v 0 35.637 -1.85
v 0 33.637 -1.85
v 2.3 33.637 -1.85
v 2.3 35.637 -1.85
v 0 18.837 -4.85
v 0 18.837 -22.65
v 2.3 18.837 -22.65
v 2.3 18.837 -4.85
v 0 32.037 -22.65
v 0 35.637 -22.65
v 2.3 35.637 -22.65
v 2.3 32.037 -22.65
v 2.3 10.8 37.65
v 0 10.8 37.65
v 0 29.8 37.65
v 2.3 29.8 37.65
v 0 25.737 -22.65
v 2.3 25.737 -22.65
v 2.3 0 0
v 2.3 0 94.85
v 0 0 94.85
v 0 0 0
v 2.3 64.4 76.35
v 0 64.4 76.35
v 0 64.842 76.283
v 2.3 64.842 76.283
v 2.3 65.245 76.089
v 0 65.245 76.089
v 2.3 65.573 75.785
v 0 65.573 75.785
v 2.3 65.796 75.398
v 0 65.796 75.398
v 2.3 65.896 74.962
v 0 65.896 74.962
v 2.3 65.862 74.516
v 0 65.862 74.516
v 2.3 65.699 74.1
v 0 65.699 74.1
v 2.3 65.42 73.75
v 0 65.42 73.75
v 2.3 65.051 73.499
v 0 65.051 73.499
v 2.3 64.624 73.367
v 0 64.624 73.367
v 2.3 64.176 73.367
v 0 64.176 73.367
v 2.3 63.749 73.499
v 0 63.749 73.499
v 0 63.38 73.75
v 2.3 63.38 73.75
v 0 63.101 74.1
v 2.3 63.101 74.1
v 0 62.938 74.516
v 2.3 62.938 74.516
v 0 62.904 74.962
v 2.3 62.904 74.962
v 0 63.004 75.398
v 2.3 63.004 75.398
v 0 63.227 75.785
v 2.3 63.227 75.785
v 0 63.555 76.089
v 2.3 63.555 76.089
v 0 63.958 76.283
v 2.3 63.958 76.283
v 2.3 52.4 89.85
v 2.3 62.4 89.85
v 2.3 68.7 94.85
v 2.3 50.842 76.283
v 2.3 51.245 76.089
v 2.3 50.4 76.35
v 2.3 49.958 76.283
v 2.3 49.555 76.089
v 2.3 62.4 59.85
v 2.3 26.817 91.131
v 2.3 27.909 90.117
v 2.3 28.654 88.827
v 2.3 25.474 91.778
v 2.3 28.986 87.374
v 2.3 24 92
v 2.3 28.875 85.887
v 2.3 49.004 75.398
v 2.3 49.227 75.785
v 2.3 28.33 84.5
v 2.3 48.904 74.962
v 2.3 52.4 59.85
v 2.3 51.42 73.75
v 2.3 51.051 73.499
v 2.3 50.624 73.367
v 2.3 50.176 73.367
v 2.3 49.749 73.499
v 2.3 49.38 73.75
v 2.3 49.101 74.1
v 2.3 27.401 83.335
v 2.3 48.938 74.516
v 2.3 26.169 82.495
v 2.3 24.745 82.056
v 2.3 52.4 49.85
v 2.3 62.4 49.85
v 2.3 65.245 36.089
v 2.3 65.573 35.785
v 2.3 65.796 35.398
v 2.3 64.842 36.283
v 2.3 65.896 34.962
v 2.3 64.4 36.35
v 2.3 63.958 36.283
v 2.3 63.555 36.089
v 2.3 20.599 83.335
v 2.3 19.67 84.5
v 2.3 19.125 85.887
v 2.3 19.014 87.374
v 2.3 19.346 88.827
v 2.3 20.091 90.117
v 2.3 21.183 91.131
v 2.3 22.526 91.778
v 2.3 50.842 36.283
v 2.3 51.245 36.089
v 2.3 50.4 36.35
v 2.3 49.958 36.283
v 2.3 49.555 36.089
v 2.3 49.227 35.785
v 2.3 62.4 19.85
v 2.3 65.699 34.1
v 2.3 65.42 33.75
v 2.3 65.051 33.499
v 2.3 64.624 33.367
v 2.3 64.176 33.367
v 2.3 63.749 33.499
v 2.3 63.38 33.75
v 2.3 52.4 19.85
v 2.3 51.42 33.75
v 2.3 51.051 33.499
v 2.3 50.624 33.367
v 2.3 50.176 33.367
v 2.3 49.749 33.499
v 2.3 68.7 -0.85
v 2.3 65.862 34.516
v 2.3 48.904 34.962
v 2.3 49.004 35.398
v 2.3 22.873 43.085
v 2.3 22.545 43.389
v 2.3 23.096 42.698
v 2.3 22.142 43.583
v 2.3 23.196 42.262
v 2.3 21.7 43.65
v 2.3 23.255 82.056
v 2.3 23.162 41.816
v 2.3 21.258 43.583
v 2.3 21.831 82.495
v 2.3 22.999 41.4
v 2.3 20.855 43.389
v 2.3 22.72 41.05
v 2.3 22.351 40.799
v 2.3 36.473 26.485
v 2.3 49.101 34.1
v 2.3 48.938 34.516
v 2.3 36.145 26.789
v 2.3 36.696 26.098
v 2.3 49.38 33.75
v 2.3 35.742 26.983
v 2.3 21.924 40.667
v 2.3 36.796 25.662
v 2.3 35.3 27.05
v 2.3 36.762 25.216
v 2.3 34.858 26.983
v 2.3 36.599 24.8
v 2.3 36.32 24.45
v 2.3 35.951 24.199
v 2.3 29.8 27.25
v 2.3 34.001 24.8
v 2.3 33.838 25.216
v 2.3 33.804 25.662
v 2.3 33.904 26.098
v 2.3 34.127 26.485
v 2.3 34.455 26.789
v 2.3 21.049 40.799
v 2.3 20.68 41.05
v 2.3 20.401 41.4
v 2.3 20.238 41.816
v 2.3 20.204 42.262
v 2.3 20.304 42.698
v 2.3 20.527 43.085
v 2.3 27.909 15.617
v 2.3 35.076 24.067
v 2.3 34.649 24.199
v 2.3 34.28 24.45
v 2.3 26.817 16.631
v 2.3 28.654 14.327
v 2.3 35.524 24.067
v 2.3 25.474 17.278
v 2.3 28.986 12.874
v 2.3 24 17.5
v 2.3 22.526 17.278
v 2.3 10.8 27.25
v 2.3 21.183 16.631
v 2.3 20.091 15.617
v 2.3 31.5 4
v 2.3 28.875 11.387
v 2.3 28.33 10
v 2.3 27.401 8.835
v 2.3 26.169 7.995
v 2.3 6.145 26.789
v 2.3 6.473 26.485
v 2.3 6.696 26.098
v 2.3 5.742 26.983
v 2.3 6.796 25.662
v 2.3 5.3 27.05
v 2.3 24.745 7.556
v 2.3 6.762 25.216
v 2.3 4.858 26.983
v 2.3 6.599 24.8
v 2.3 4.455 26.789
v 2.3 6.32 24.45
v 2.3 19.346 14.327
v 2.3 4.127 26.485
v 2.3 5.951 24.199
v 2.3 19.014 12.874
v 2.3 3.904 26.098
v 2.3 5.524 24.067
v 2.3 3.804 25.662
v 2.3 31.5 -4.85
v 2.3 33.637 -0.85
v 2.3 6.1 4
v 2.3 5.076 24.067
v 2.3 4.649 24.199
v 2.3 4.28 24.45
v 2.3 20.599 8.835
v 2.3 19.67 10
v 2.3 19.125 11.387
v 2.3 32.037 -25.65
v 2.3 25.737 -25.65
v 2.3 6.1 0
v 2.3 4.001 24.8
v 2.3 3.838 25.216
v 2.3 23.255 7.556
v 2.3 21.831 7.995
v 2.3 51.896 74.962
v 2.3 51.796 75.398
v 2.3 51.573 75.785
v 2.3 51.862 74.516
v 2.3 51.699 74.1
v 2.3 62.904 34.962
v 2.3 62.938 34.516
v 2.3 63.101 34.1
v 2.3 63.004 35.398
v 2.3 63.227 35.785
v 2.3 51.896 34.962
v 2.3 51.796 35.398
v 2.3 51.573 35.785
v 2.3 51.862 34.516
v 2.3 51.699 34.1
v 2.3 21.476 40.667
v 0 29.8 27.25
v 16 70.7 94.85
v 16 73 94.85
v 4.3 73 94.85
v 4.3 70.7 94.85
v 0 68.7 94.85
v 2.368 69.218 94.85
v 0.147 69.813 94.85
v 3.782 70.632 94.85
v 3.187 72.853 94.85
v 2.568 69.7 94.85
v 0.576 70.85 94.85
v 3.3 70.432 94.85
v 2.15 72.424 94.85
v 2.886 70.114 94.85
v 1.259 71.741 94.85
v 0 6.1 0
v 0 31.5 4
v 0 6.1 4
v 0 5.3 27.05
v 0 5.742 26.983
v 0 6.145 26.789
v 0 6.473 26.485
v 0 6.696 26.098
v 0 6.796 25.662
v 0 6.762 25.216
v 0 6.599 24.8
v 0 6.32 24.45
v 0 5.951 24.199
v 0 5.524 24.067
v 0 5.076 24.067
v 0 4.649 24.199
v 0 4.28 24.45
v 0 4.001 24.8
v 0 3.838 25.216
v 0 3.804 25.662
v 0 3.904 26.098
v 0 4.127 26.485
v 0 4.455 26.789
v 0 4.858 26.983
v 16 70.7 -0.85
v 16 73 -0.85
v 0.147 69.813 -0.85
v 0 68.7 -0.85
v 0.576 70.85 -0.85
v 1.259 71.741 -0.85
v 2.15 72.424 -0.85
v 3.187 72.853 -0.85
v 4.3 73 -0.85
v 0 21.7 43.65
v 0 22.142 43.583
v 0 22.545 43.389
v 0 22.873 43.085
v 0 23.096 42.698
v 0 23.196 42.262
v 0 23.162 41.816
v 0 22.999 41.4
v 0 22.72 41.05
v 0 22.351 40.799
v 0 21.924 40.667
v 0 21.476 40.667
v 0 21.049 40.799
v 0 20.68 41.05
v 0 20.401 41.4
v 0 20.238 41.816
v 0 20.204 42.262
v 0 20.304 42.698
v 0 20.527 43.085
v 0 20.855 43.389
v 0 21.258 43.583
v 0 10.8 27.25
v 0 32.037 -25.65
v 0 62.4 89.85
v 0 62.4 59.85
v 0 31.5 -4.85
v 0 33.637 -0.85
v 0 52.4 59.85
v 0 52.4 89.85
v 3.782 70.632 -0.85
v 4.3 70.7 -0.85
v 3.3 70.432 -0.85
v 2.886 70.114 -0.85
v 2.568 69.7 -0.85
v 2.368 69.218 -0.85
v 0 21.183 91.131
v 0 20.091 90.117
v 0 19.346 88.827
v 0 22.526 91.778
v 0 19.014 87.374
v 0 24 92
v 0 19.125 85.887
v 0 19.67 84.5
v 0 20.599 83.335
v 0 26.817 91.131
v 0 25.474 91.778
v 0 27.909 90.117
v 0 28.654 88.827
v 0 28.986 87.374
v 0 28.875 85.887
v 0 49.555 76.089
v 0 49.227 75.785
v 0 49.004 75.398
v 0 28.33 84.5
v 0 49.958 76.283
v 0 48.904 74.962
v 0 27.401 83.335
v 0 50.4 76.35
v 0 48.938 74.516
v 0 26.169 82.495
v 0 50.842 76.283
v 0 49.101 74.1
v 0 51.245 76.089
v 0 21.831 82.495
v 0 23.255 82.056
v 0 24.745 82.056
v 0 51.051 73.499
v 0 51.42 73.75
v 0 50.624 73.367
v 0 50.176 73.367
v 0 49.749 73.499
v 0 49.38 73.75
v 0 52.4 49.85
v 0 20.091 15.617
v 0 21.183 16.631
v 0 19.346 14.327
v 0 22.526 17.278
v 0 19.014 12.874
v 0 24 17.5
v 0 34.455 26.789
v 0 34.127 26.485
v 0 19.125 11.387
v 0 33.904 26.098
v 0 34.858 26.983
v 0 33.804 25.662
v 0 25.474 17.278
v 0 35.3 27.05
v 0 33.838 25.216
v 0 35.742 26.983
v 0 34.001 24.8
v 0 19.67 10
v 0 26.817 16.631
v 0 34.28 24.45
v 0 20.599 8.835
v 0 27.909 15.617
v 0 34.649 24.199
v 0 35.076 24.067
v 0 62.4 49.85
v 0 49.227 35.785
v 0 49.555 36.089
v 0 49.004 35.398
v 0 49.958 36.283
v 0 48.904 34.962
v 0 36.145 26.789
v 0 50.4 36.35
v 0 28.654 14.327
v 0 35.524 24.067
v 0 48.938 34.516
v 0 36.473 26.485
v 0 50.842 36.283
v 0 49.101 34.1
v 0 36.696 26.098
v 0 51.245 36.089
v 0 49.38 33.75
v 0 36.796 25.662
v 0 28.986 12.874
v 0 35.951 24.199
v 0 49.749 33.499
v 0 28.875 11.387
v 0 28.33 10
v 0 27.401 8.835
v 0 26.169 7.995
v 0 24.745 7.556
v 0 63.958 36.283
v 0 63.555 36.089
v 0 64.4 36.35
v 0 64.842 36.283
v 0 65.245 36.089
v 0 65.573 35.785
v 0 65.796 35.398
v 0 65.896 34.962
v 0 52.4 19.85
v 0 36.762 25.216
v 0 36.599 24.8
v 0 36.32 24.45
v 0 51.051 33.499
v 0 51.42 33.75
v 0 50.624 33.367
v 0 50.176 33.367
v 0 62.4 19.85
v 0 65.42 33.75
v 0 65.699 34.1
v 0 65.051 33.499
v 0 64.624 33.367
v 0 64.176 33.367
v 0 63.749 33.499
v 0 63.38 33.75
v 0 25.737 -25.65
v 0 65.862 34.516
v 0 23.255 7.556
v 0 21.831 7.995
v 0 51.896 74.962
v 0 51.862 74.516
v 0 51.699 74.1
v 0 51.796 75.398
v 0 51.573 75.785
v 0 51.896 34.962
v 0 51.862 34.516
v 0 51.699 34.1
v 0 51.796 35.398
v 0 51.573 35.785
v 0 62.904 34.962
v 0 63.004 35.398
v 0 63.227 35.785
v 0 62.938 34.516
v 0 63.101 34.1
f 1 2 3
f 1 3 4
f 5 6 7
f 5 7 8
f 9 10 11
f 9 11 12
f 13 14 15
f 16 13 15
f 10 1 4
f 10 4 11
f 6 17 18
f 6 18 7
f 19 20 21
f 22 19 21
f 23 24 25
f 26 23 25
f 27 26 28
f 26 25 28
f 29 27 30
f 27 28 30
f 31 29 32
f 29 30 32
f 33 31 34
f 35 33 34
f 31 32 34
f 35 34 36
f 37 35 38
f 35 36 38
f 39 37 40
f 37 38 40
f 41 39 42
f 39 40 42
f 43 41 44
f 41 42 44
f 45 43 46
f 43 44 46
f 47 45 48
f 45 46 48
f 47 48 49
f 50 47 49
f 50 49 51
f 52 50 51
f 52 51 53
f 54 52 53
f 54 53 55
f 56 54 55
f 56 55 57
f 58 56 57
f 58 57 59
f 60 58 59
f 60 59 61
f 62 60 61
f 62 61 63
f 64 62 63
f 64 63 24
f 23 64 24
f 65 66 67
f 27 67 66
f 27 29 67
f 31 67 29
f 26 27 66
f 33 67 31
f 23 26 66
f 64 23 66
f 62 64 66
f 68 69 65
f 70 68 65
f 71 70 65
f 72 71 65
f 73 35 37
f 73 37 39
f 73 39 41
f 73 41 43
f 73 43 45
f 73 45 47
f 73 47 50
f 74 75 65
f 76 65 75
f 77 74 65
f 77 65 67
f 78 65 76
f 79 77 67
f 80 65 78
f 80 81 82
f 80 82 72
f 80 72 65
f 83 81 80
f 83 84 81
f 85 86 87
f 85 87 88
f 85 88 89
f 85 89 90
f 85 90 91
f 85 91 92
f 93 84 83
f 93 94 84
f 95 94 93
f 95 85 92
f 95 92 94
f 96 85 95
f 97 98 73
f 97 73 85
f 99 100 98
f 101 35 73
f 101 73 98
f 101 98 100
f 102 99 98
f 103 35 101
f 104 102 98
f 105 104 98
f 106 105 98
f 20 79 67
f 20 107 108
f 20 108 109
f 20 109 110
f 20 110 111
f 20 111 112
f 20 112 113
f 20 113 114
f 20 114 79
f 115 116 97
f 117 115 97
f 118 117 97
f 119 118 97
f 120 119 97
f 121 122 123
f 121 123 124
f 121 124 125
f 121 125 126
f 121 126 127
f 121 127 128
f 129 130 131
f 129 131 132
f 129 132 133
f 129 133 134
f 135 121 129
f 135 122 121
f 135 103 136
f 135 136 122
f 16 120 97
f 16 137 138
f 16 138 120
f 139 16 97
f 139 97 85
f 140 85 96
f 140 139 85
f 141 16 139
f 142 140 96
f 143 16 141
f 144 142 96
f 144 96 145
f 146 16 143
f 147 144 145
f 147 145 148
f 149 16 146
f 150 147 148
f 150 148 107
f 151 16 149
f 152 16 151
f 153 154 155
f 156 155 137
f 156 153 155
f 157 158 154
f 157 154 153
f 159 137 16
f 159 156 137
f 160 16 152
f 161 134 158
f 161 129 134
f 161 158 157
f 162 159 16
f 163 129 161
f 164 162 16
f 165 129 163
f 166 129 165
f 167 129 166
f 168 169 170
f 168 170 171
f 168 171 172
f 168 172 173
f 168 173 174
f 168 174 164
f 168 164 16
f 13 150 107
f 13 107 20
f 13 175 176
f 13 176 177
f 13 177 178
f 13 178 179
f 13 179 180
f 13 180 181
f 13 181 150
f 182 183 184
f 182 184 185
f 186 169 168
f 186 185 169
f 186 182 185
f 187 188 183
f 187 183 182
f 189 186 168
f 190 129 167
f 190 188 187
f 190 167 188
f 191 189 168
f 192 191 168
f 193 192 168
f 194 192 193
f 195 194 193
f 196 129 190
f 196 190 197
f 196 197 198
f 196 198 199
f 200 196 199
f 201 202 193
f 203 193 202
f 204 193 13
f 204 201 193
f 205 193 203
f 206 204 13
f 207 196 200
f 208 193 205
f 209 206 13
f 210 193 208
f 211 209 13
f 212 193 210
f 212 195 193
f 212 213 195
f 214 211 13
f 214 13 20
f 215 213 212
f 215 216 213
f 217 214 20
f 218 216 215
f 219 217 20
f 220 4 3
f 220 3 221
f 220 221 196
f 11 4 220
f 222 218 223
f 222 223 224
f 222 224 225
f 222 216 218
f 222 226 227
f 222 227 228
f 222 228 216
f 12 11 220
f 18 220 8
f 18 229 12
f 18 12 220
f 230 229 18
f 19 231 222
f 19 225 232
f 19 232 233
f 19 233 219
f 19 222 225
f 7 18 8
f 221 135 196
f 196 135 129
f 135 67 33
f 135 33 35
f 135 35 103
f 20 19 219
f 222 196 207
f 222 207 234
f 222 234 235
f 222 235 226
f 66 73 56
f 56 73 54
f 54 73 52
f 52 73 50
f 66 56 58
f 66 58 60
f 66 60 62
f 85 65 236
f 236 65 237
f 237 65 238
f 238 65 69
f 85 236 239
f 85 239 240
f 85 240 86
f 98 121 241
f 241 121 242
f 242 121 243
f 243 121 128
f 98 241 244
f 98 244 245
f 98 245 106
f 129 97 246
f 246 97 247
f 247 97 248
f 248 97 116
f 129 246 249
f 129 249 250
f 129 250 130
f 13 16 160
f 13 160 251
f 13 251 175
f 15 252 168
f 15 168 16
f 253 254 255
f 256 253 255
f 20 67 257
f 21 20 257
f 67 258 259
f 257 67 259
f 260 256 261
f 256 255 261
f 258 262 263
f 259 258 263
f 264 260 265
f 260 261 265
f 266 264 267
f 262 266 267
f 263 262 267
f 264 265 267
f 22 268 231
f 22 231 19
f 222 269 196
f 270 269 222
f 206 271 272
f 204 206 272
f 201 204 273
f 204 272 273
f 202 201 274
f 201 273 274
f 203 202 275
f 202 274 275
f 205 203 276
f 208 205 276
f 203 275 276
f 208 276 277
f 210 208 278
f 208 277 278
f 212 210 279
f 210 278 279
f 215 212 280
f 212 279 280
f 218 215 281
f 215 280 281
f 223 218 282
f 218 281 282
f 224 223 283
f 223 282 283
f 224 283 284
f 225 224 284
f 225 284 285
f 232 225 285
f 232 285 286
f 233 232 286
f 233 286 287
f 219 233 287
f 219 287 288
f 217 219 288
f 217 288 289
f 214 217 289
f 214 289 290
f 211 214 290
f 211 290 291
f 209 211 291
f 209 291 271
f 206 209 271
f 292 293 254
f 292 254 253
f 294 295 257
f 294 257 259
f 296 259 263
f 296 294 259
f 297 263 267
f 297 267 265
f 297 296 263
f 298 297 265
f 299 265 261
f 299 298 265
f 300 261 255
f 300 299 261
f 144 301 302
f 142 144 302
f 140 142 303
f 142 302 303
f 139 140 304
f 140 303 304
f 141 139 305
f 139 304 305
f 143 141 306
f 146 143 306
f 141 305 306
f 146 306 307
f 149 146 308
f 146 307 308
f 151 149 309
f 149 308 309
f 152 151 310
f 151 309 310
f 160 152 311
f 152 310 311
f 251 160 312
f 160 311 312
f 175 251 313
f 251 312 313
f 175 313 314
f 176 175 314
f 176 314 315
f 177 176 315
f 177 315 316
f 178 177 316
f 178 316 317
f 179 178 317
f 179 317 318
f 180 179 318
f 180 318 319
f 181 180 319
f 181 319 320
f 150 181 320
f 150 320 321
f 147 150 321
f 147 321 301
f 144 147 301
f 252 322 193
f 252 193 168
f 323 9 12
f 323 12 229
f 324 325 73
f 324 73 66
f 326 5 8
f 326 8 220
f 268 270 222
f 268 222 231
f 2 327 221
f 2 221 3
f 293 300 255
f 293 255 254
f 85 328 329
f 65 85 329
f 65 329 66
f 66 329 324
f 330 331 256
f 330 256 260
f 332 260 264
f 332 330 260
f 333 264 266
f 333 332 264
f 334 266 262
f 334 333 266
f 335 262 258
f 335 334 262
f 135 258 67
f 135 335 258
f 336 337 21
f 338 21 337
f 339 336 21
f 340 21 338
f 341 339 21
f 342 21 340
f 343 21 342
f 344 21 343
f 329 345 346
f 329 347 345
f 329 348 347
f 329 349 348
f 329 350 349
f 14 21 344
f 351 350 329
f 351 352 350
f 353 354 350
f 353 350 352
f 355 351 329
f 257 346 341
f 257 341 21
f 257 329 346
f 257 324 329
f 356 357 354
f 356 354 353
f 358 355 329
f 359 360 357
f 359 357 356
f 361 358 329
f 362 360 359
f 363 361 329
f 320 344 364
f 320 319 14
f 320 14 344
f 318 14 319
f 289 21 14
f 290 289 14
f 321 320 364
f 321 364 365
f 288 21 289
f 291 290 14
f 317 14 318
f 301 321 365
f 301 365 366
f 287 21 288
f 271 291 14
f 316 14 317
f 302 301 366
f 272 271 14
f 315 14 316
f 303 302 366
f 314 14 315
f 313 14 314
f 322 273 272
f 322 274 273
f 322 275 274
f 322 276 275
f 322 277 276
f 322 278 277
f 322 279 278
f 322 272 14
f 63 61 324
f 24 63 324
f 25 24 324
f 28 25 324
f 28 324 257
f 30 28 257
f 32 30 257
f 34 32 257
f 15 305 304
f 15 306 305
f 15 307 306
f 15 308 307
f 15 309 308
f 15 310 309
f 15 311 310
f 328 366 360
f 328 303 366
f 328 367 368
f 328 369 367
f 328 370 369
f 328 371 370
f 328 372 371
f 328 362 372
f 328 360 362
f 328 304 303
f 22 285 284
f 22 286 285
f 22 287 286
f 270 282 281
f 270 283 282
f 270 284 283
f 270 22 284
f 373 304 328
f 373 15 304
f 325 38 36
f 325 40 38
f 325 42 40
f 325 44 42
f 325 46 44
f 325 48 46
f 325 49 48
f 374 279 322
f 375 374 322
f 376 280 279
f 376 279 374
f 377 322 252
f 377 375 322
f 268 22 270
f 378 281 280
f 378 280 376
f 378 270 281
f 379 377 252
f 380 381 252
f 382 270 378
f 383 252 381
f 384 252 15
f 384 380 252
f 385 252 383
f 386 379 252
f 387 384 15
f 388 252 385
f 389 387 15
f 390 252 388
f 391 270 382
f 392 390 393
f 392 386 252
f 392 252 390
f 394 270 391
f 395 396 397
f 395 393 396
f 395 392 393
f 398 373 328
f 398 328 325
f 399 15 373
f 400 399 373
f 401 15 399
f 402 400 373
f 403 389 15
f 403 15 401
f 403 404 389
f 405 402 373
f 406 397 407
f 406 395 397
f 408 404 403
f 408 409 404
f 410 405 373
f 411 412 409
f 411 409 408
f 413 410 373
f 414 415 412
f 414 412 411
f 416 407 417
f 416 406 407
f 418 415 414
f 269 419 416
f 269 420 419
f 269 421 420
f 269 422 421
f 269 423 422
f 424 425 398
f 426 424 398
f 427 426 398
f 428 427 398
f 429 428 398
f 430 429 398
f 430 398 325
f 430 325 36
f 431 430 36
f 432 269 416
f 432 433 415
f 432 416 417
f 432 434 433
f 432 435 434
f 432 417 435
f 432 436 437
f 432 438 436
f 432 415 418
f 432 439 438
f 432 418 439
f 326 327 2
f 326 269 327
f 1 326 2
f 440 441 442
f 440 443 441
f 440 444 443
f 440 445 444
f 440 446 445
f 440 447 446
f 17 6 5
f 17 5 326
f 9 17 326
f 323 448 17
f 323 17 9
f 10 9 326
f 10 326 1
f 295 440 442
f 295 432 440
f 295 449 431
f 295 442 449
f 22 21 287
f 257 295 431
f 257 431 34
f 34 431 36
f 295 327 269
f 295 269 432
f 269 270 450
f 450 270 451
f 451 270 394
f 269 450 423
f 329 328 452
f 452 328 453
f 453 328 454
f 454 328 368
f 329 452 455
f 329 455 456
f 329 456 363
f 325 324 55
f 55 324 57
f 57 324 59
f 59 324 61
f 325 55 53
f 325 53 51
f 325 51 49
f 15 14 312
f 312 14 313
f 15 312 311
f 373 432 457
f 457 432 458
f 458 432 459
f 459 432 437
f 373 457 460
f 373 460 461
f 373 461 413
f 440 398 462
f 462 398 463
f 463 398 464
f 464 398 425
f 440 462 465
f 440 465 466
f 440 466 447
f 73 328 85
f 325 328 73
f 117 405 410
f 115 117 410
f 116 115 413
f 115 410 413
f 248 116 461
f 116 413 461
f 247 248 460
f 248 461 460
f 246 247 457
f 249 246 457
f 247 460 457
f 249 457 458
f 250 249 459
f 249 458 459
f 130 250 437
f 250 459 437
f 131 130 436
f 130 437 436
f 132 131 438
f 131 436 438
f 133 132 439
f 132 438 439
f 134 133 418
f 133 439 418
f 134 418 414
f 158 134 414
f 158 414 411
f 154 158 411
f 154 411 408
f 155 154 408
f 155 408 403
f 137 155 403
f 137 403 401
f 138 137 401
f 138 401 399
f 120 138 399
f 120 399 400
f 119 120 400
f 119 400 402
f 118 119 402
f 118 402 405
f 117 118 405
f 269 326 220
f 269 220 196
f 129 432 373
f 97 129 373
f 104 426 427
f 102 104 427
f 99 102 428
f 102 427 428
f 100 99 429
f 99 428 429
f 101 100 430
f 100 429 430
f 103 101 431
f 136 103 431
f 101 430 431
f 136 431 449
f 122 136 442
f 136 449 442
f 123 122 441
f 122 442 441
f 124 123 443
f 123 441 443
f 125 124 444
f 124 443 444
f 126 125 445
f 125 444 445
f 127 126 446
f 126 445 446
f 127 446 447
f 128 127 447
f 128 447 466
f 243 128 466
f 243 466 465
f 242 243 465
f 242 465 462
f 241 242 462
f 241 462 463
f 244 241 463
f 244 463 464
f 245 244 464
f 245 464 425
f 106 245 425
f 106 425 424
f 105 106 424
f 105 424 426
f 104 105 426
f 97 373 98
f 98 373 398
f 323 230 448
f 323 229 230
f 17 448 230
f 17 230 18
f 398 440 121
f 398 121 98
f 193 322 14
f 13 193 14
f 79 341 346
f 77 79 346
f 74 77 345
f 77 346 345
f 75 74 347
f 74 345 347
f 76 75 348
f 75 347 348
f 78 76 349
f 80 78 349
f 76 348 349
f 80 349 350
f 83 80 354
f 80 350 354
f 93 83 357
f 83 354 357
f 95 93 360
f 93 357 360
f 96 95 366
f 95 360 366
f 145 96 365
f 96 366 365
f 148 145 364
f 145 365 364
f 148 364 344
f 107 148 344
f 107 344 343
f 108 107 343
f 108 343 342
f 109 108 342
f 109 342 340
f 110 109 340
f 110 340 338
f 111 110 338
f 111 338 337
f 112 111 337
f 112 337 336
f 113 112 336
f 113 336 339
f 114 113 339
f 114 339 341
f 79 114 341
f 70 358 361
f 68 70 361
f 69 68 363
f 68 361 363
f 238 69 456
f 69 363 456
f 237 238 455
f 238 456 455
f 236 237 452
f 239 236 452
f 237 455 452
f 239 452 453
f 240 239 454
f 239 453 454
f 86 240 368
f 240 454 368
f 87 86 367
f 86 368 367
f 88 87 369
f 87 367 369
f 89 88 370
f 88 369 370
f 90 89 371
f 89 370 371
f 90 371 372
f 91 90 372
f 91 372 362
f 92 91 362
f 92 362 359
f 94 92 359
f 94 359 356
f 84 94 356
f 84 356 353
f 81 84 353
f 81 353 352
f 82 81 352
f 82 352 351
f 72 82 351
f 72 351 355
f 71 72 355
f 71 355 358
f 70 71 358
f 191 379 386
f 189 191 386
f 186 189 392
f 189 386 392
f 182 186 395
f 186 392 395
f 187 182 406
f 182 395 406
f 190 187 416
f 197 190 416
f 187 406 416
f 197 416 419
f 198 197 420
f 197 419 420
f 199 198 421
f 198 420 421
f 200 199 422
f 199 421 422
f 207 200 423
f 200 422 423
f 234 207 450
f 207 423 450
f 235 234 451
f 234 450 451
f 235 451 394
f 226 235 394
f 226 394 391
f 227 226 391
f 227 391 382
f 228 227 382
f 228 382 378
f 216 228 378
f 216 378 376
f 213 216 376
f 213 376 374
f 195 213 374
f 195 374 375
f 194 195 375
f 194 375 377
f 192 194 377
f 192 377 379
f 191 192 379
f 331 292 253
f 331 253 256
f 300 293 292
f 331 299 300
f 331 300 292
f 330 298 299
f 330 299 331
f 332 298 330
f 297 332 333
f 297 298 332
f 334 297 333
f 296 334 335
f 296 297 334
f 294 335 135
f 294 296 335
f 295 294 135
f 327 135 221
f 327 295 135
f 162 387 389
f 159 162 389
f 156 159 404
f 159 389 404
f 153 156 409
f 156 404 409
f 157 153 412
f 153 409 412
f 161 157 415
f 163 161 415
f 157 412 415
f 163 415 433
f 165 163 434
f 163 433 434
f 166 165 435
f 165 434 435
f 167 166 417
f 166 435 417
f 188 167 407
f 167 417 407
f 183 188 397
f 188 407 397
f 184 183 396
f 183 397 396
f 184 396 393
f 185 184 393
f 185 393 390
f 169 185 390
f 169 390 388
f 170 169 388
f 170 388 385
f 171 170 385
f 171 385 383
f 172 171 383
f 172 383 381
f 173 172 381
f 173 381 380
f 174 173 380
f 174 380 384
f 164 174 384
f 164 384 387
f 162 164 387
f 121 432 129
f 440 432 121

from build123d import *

# Parameters (mm, degrees)
BASE_FLANGE1_DEPTH      = 94.85
BASE_FLANGE1_DEPTH_BACK = 25.65
SKETCH7_R               = 1.5
SKETCH7_R_2             = 5
SKETCH7_W               = 10.4
SKETCH7_H               = 19
SKETCH7_W_2             = 30
SKETCH7_H_2             = 10
CUT_EXTRUDE2_DEPTH      = 121.75397509


# Sheet-metal steps are written as plain solids
with BuildPart() as part:
    # Sketch2 → Base-Flange1 (new, two sides: drawn at the far end of the back side and taken through both)
    with BuildSketch(Plane.XY.offset(-BASE_FLANGE1_DEPTH_BACK)):
        with BuildLine():
            Line((0, 0), (0, 68.7))
            ThreePointArc((0, 68.7), (1.259440841, 71.740559159), (4.3, 73))
            Line((4.3, 73), (16, 73))
            Line((16, 73), (16, 70.7))
            Line((16, 70.7), (4.3, 70.7))
            ThreePointArc((4.3, 70.7), (2.885786438, 70.114213562), (2.3, 68.7))
            Line((2.3, 68.7), (2.3, 0))
            Line((2.3, 0), (0, 0))
        make_face()
    extrude(amount=BASE_FLANGE1_DEPTH + BASE_FLANGE1_DEPTH_BACK)

    # Sketch7 → Cut-Extrude2 (cut, through all)
    with BuildSketch(Plane.ZY):
        with Locations((34.85, 64.4)):
            Circle(SKETCH7_R)
        with Locations((34.85, 50.4)):
            Circle(SKETCH7_R)
        with Locations((74.85, 64.4)):
            Circle(SKETCH7_R)
        with Locations((74.85, 50.4)):
            Circle(SKETCH7_R)
        with Locations((25.55, 35.3)):
            Circle(SKETCH7_R)
        with Locations((25.55, 5.3)):
            Circle(SKETCH7_R)
        with Locations((42.15, 21.7)):
            Circle(SKETCH7_R)
        with Locations((87, 24)):
            Circle(SKETCH7_R_2)
        with Locations((12.5, 24)):
            Circle(SKETCH7_R_2)
        with Locations((32.45, 20.3)):
            Rectangle(SKETCH7_W, SKETCH7_H)
        with Locations((74.85, 57.4)):
            Rectangle(SKETCH7_W_2, SKETCH7_H_2)
        with Locations((34.85, 57.4)):
            Rectangle(SKETCH7_W_2, SKETCH7_H_2)
        Polygon((-0.85, 33.637171027), (-1.85, 33.637171027), (-1.85, 35.637171027), (-22.65, 35.637171027), (-22.65, 32.037171027), (-25.65, 32.037171027), (-25.65, 73), (-0.85, 73), align=None)
        Polygon((-22.65, 25.737171027), (-22.65, 18.837171027), (-4.85, 18.837171027), (-4.85, 31.5), (4, 31.5), (4, 6.1), (0, 6.1), (0, 0), (-25.65, 0), (-25.65, 25.737171027), align=None)
    extrude(amount=-CUT_EXTRUDE2_DEPTH, mode=Mode.SUBTRACT)


solid = part.part
